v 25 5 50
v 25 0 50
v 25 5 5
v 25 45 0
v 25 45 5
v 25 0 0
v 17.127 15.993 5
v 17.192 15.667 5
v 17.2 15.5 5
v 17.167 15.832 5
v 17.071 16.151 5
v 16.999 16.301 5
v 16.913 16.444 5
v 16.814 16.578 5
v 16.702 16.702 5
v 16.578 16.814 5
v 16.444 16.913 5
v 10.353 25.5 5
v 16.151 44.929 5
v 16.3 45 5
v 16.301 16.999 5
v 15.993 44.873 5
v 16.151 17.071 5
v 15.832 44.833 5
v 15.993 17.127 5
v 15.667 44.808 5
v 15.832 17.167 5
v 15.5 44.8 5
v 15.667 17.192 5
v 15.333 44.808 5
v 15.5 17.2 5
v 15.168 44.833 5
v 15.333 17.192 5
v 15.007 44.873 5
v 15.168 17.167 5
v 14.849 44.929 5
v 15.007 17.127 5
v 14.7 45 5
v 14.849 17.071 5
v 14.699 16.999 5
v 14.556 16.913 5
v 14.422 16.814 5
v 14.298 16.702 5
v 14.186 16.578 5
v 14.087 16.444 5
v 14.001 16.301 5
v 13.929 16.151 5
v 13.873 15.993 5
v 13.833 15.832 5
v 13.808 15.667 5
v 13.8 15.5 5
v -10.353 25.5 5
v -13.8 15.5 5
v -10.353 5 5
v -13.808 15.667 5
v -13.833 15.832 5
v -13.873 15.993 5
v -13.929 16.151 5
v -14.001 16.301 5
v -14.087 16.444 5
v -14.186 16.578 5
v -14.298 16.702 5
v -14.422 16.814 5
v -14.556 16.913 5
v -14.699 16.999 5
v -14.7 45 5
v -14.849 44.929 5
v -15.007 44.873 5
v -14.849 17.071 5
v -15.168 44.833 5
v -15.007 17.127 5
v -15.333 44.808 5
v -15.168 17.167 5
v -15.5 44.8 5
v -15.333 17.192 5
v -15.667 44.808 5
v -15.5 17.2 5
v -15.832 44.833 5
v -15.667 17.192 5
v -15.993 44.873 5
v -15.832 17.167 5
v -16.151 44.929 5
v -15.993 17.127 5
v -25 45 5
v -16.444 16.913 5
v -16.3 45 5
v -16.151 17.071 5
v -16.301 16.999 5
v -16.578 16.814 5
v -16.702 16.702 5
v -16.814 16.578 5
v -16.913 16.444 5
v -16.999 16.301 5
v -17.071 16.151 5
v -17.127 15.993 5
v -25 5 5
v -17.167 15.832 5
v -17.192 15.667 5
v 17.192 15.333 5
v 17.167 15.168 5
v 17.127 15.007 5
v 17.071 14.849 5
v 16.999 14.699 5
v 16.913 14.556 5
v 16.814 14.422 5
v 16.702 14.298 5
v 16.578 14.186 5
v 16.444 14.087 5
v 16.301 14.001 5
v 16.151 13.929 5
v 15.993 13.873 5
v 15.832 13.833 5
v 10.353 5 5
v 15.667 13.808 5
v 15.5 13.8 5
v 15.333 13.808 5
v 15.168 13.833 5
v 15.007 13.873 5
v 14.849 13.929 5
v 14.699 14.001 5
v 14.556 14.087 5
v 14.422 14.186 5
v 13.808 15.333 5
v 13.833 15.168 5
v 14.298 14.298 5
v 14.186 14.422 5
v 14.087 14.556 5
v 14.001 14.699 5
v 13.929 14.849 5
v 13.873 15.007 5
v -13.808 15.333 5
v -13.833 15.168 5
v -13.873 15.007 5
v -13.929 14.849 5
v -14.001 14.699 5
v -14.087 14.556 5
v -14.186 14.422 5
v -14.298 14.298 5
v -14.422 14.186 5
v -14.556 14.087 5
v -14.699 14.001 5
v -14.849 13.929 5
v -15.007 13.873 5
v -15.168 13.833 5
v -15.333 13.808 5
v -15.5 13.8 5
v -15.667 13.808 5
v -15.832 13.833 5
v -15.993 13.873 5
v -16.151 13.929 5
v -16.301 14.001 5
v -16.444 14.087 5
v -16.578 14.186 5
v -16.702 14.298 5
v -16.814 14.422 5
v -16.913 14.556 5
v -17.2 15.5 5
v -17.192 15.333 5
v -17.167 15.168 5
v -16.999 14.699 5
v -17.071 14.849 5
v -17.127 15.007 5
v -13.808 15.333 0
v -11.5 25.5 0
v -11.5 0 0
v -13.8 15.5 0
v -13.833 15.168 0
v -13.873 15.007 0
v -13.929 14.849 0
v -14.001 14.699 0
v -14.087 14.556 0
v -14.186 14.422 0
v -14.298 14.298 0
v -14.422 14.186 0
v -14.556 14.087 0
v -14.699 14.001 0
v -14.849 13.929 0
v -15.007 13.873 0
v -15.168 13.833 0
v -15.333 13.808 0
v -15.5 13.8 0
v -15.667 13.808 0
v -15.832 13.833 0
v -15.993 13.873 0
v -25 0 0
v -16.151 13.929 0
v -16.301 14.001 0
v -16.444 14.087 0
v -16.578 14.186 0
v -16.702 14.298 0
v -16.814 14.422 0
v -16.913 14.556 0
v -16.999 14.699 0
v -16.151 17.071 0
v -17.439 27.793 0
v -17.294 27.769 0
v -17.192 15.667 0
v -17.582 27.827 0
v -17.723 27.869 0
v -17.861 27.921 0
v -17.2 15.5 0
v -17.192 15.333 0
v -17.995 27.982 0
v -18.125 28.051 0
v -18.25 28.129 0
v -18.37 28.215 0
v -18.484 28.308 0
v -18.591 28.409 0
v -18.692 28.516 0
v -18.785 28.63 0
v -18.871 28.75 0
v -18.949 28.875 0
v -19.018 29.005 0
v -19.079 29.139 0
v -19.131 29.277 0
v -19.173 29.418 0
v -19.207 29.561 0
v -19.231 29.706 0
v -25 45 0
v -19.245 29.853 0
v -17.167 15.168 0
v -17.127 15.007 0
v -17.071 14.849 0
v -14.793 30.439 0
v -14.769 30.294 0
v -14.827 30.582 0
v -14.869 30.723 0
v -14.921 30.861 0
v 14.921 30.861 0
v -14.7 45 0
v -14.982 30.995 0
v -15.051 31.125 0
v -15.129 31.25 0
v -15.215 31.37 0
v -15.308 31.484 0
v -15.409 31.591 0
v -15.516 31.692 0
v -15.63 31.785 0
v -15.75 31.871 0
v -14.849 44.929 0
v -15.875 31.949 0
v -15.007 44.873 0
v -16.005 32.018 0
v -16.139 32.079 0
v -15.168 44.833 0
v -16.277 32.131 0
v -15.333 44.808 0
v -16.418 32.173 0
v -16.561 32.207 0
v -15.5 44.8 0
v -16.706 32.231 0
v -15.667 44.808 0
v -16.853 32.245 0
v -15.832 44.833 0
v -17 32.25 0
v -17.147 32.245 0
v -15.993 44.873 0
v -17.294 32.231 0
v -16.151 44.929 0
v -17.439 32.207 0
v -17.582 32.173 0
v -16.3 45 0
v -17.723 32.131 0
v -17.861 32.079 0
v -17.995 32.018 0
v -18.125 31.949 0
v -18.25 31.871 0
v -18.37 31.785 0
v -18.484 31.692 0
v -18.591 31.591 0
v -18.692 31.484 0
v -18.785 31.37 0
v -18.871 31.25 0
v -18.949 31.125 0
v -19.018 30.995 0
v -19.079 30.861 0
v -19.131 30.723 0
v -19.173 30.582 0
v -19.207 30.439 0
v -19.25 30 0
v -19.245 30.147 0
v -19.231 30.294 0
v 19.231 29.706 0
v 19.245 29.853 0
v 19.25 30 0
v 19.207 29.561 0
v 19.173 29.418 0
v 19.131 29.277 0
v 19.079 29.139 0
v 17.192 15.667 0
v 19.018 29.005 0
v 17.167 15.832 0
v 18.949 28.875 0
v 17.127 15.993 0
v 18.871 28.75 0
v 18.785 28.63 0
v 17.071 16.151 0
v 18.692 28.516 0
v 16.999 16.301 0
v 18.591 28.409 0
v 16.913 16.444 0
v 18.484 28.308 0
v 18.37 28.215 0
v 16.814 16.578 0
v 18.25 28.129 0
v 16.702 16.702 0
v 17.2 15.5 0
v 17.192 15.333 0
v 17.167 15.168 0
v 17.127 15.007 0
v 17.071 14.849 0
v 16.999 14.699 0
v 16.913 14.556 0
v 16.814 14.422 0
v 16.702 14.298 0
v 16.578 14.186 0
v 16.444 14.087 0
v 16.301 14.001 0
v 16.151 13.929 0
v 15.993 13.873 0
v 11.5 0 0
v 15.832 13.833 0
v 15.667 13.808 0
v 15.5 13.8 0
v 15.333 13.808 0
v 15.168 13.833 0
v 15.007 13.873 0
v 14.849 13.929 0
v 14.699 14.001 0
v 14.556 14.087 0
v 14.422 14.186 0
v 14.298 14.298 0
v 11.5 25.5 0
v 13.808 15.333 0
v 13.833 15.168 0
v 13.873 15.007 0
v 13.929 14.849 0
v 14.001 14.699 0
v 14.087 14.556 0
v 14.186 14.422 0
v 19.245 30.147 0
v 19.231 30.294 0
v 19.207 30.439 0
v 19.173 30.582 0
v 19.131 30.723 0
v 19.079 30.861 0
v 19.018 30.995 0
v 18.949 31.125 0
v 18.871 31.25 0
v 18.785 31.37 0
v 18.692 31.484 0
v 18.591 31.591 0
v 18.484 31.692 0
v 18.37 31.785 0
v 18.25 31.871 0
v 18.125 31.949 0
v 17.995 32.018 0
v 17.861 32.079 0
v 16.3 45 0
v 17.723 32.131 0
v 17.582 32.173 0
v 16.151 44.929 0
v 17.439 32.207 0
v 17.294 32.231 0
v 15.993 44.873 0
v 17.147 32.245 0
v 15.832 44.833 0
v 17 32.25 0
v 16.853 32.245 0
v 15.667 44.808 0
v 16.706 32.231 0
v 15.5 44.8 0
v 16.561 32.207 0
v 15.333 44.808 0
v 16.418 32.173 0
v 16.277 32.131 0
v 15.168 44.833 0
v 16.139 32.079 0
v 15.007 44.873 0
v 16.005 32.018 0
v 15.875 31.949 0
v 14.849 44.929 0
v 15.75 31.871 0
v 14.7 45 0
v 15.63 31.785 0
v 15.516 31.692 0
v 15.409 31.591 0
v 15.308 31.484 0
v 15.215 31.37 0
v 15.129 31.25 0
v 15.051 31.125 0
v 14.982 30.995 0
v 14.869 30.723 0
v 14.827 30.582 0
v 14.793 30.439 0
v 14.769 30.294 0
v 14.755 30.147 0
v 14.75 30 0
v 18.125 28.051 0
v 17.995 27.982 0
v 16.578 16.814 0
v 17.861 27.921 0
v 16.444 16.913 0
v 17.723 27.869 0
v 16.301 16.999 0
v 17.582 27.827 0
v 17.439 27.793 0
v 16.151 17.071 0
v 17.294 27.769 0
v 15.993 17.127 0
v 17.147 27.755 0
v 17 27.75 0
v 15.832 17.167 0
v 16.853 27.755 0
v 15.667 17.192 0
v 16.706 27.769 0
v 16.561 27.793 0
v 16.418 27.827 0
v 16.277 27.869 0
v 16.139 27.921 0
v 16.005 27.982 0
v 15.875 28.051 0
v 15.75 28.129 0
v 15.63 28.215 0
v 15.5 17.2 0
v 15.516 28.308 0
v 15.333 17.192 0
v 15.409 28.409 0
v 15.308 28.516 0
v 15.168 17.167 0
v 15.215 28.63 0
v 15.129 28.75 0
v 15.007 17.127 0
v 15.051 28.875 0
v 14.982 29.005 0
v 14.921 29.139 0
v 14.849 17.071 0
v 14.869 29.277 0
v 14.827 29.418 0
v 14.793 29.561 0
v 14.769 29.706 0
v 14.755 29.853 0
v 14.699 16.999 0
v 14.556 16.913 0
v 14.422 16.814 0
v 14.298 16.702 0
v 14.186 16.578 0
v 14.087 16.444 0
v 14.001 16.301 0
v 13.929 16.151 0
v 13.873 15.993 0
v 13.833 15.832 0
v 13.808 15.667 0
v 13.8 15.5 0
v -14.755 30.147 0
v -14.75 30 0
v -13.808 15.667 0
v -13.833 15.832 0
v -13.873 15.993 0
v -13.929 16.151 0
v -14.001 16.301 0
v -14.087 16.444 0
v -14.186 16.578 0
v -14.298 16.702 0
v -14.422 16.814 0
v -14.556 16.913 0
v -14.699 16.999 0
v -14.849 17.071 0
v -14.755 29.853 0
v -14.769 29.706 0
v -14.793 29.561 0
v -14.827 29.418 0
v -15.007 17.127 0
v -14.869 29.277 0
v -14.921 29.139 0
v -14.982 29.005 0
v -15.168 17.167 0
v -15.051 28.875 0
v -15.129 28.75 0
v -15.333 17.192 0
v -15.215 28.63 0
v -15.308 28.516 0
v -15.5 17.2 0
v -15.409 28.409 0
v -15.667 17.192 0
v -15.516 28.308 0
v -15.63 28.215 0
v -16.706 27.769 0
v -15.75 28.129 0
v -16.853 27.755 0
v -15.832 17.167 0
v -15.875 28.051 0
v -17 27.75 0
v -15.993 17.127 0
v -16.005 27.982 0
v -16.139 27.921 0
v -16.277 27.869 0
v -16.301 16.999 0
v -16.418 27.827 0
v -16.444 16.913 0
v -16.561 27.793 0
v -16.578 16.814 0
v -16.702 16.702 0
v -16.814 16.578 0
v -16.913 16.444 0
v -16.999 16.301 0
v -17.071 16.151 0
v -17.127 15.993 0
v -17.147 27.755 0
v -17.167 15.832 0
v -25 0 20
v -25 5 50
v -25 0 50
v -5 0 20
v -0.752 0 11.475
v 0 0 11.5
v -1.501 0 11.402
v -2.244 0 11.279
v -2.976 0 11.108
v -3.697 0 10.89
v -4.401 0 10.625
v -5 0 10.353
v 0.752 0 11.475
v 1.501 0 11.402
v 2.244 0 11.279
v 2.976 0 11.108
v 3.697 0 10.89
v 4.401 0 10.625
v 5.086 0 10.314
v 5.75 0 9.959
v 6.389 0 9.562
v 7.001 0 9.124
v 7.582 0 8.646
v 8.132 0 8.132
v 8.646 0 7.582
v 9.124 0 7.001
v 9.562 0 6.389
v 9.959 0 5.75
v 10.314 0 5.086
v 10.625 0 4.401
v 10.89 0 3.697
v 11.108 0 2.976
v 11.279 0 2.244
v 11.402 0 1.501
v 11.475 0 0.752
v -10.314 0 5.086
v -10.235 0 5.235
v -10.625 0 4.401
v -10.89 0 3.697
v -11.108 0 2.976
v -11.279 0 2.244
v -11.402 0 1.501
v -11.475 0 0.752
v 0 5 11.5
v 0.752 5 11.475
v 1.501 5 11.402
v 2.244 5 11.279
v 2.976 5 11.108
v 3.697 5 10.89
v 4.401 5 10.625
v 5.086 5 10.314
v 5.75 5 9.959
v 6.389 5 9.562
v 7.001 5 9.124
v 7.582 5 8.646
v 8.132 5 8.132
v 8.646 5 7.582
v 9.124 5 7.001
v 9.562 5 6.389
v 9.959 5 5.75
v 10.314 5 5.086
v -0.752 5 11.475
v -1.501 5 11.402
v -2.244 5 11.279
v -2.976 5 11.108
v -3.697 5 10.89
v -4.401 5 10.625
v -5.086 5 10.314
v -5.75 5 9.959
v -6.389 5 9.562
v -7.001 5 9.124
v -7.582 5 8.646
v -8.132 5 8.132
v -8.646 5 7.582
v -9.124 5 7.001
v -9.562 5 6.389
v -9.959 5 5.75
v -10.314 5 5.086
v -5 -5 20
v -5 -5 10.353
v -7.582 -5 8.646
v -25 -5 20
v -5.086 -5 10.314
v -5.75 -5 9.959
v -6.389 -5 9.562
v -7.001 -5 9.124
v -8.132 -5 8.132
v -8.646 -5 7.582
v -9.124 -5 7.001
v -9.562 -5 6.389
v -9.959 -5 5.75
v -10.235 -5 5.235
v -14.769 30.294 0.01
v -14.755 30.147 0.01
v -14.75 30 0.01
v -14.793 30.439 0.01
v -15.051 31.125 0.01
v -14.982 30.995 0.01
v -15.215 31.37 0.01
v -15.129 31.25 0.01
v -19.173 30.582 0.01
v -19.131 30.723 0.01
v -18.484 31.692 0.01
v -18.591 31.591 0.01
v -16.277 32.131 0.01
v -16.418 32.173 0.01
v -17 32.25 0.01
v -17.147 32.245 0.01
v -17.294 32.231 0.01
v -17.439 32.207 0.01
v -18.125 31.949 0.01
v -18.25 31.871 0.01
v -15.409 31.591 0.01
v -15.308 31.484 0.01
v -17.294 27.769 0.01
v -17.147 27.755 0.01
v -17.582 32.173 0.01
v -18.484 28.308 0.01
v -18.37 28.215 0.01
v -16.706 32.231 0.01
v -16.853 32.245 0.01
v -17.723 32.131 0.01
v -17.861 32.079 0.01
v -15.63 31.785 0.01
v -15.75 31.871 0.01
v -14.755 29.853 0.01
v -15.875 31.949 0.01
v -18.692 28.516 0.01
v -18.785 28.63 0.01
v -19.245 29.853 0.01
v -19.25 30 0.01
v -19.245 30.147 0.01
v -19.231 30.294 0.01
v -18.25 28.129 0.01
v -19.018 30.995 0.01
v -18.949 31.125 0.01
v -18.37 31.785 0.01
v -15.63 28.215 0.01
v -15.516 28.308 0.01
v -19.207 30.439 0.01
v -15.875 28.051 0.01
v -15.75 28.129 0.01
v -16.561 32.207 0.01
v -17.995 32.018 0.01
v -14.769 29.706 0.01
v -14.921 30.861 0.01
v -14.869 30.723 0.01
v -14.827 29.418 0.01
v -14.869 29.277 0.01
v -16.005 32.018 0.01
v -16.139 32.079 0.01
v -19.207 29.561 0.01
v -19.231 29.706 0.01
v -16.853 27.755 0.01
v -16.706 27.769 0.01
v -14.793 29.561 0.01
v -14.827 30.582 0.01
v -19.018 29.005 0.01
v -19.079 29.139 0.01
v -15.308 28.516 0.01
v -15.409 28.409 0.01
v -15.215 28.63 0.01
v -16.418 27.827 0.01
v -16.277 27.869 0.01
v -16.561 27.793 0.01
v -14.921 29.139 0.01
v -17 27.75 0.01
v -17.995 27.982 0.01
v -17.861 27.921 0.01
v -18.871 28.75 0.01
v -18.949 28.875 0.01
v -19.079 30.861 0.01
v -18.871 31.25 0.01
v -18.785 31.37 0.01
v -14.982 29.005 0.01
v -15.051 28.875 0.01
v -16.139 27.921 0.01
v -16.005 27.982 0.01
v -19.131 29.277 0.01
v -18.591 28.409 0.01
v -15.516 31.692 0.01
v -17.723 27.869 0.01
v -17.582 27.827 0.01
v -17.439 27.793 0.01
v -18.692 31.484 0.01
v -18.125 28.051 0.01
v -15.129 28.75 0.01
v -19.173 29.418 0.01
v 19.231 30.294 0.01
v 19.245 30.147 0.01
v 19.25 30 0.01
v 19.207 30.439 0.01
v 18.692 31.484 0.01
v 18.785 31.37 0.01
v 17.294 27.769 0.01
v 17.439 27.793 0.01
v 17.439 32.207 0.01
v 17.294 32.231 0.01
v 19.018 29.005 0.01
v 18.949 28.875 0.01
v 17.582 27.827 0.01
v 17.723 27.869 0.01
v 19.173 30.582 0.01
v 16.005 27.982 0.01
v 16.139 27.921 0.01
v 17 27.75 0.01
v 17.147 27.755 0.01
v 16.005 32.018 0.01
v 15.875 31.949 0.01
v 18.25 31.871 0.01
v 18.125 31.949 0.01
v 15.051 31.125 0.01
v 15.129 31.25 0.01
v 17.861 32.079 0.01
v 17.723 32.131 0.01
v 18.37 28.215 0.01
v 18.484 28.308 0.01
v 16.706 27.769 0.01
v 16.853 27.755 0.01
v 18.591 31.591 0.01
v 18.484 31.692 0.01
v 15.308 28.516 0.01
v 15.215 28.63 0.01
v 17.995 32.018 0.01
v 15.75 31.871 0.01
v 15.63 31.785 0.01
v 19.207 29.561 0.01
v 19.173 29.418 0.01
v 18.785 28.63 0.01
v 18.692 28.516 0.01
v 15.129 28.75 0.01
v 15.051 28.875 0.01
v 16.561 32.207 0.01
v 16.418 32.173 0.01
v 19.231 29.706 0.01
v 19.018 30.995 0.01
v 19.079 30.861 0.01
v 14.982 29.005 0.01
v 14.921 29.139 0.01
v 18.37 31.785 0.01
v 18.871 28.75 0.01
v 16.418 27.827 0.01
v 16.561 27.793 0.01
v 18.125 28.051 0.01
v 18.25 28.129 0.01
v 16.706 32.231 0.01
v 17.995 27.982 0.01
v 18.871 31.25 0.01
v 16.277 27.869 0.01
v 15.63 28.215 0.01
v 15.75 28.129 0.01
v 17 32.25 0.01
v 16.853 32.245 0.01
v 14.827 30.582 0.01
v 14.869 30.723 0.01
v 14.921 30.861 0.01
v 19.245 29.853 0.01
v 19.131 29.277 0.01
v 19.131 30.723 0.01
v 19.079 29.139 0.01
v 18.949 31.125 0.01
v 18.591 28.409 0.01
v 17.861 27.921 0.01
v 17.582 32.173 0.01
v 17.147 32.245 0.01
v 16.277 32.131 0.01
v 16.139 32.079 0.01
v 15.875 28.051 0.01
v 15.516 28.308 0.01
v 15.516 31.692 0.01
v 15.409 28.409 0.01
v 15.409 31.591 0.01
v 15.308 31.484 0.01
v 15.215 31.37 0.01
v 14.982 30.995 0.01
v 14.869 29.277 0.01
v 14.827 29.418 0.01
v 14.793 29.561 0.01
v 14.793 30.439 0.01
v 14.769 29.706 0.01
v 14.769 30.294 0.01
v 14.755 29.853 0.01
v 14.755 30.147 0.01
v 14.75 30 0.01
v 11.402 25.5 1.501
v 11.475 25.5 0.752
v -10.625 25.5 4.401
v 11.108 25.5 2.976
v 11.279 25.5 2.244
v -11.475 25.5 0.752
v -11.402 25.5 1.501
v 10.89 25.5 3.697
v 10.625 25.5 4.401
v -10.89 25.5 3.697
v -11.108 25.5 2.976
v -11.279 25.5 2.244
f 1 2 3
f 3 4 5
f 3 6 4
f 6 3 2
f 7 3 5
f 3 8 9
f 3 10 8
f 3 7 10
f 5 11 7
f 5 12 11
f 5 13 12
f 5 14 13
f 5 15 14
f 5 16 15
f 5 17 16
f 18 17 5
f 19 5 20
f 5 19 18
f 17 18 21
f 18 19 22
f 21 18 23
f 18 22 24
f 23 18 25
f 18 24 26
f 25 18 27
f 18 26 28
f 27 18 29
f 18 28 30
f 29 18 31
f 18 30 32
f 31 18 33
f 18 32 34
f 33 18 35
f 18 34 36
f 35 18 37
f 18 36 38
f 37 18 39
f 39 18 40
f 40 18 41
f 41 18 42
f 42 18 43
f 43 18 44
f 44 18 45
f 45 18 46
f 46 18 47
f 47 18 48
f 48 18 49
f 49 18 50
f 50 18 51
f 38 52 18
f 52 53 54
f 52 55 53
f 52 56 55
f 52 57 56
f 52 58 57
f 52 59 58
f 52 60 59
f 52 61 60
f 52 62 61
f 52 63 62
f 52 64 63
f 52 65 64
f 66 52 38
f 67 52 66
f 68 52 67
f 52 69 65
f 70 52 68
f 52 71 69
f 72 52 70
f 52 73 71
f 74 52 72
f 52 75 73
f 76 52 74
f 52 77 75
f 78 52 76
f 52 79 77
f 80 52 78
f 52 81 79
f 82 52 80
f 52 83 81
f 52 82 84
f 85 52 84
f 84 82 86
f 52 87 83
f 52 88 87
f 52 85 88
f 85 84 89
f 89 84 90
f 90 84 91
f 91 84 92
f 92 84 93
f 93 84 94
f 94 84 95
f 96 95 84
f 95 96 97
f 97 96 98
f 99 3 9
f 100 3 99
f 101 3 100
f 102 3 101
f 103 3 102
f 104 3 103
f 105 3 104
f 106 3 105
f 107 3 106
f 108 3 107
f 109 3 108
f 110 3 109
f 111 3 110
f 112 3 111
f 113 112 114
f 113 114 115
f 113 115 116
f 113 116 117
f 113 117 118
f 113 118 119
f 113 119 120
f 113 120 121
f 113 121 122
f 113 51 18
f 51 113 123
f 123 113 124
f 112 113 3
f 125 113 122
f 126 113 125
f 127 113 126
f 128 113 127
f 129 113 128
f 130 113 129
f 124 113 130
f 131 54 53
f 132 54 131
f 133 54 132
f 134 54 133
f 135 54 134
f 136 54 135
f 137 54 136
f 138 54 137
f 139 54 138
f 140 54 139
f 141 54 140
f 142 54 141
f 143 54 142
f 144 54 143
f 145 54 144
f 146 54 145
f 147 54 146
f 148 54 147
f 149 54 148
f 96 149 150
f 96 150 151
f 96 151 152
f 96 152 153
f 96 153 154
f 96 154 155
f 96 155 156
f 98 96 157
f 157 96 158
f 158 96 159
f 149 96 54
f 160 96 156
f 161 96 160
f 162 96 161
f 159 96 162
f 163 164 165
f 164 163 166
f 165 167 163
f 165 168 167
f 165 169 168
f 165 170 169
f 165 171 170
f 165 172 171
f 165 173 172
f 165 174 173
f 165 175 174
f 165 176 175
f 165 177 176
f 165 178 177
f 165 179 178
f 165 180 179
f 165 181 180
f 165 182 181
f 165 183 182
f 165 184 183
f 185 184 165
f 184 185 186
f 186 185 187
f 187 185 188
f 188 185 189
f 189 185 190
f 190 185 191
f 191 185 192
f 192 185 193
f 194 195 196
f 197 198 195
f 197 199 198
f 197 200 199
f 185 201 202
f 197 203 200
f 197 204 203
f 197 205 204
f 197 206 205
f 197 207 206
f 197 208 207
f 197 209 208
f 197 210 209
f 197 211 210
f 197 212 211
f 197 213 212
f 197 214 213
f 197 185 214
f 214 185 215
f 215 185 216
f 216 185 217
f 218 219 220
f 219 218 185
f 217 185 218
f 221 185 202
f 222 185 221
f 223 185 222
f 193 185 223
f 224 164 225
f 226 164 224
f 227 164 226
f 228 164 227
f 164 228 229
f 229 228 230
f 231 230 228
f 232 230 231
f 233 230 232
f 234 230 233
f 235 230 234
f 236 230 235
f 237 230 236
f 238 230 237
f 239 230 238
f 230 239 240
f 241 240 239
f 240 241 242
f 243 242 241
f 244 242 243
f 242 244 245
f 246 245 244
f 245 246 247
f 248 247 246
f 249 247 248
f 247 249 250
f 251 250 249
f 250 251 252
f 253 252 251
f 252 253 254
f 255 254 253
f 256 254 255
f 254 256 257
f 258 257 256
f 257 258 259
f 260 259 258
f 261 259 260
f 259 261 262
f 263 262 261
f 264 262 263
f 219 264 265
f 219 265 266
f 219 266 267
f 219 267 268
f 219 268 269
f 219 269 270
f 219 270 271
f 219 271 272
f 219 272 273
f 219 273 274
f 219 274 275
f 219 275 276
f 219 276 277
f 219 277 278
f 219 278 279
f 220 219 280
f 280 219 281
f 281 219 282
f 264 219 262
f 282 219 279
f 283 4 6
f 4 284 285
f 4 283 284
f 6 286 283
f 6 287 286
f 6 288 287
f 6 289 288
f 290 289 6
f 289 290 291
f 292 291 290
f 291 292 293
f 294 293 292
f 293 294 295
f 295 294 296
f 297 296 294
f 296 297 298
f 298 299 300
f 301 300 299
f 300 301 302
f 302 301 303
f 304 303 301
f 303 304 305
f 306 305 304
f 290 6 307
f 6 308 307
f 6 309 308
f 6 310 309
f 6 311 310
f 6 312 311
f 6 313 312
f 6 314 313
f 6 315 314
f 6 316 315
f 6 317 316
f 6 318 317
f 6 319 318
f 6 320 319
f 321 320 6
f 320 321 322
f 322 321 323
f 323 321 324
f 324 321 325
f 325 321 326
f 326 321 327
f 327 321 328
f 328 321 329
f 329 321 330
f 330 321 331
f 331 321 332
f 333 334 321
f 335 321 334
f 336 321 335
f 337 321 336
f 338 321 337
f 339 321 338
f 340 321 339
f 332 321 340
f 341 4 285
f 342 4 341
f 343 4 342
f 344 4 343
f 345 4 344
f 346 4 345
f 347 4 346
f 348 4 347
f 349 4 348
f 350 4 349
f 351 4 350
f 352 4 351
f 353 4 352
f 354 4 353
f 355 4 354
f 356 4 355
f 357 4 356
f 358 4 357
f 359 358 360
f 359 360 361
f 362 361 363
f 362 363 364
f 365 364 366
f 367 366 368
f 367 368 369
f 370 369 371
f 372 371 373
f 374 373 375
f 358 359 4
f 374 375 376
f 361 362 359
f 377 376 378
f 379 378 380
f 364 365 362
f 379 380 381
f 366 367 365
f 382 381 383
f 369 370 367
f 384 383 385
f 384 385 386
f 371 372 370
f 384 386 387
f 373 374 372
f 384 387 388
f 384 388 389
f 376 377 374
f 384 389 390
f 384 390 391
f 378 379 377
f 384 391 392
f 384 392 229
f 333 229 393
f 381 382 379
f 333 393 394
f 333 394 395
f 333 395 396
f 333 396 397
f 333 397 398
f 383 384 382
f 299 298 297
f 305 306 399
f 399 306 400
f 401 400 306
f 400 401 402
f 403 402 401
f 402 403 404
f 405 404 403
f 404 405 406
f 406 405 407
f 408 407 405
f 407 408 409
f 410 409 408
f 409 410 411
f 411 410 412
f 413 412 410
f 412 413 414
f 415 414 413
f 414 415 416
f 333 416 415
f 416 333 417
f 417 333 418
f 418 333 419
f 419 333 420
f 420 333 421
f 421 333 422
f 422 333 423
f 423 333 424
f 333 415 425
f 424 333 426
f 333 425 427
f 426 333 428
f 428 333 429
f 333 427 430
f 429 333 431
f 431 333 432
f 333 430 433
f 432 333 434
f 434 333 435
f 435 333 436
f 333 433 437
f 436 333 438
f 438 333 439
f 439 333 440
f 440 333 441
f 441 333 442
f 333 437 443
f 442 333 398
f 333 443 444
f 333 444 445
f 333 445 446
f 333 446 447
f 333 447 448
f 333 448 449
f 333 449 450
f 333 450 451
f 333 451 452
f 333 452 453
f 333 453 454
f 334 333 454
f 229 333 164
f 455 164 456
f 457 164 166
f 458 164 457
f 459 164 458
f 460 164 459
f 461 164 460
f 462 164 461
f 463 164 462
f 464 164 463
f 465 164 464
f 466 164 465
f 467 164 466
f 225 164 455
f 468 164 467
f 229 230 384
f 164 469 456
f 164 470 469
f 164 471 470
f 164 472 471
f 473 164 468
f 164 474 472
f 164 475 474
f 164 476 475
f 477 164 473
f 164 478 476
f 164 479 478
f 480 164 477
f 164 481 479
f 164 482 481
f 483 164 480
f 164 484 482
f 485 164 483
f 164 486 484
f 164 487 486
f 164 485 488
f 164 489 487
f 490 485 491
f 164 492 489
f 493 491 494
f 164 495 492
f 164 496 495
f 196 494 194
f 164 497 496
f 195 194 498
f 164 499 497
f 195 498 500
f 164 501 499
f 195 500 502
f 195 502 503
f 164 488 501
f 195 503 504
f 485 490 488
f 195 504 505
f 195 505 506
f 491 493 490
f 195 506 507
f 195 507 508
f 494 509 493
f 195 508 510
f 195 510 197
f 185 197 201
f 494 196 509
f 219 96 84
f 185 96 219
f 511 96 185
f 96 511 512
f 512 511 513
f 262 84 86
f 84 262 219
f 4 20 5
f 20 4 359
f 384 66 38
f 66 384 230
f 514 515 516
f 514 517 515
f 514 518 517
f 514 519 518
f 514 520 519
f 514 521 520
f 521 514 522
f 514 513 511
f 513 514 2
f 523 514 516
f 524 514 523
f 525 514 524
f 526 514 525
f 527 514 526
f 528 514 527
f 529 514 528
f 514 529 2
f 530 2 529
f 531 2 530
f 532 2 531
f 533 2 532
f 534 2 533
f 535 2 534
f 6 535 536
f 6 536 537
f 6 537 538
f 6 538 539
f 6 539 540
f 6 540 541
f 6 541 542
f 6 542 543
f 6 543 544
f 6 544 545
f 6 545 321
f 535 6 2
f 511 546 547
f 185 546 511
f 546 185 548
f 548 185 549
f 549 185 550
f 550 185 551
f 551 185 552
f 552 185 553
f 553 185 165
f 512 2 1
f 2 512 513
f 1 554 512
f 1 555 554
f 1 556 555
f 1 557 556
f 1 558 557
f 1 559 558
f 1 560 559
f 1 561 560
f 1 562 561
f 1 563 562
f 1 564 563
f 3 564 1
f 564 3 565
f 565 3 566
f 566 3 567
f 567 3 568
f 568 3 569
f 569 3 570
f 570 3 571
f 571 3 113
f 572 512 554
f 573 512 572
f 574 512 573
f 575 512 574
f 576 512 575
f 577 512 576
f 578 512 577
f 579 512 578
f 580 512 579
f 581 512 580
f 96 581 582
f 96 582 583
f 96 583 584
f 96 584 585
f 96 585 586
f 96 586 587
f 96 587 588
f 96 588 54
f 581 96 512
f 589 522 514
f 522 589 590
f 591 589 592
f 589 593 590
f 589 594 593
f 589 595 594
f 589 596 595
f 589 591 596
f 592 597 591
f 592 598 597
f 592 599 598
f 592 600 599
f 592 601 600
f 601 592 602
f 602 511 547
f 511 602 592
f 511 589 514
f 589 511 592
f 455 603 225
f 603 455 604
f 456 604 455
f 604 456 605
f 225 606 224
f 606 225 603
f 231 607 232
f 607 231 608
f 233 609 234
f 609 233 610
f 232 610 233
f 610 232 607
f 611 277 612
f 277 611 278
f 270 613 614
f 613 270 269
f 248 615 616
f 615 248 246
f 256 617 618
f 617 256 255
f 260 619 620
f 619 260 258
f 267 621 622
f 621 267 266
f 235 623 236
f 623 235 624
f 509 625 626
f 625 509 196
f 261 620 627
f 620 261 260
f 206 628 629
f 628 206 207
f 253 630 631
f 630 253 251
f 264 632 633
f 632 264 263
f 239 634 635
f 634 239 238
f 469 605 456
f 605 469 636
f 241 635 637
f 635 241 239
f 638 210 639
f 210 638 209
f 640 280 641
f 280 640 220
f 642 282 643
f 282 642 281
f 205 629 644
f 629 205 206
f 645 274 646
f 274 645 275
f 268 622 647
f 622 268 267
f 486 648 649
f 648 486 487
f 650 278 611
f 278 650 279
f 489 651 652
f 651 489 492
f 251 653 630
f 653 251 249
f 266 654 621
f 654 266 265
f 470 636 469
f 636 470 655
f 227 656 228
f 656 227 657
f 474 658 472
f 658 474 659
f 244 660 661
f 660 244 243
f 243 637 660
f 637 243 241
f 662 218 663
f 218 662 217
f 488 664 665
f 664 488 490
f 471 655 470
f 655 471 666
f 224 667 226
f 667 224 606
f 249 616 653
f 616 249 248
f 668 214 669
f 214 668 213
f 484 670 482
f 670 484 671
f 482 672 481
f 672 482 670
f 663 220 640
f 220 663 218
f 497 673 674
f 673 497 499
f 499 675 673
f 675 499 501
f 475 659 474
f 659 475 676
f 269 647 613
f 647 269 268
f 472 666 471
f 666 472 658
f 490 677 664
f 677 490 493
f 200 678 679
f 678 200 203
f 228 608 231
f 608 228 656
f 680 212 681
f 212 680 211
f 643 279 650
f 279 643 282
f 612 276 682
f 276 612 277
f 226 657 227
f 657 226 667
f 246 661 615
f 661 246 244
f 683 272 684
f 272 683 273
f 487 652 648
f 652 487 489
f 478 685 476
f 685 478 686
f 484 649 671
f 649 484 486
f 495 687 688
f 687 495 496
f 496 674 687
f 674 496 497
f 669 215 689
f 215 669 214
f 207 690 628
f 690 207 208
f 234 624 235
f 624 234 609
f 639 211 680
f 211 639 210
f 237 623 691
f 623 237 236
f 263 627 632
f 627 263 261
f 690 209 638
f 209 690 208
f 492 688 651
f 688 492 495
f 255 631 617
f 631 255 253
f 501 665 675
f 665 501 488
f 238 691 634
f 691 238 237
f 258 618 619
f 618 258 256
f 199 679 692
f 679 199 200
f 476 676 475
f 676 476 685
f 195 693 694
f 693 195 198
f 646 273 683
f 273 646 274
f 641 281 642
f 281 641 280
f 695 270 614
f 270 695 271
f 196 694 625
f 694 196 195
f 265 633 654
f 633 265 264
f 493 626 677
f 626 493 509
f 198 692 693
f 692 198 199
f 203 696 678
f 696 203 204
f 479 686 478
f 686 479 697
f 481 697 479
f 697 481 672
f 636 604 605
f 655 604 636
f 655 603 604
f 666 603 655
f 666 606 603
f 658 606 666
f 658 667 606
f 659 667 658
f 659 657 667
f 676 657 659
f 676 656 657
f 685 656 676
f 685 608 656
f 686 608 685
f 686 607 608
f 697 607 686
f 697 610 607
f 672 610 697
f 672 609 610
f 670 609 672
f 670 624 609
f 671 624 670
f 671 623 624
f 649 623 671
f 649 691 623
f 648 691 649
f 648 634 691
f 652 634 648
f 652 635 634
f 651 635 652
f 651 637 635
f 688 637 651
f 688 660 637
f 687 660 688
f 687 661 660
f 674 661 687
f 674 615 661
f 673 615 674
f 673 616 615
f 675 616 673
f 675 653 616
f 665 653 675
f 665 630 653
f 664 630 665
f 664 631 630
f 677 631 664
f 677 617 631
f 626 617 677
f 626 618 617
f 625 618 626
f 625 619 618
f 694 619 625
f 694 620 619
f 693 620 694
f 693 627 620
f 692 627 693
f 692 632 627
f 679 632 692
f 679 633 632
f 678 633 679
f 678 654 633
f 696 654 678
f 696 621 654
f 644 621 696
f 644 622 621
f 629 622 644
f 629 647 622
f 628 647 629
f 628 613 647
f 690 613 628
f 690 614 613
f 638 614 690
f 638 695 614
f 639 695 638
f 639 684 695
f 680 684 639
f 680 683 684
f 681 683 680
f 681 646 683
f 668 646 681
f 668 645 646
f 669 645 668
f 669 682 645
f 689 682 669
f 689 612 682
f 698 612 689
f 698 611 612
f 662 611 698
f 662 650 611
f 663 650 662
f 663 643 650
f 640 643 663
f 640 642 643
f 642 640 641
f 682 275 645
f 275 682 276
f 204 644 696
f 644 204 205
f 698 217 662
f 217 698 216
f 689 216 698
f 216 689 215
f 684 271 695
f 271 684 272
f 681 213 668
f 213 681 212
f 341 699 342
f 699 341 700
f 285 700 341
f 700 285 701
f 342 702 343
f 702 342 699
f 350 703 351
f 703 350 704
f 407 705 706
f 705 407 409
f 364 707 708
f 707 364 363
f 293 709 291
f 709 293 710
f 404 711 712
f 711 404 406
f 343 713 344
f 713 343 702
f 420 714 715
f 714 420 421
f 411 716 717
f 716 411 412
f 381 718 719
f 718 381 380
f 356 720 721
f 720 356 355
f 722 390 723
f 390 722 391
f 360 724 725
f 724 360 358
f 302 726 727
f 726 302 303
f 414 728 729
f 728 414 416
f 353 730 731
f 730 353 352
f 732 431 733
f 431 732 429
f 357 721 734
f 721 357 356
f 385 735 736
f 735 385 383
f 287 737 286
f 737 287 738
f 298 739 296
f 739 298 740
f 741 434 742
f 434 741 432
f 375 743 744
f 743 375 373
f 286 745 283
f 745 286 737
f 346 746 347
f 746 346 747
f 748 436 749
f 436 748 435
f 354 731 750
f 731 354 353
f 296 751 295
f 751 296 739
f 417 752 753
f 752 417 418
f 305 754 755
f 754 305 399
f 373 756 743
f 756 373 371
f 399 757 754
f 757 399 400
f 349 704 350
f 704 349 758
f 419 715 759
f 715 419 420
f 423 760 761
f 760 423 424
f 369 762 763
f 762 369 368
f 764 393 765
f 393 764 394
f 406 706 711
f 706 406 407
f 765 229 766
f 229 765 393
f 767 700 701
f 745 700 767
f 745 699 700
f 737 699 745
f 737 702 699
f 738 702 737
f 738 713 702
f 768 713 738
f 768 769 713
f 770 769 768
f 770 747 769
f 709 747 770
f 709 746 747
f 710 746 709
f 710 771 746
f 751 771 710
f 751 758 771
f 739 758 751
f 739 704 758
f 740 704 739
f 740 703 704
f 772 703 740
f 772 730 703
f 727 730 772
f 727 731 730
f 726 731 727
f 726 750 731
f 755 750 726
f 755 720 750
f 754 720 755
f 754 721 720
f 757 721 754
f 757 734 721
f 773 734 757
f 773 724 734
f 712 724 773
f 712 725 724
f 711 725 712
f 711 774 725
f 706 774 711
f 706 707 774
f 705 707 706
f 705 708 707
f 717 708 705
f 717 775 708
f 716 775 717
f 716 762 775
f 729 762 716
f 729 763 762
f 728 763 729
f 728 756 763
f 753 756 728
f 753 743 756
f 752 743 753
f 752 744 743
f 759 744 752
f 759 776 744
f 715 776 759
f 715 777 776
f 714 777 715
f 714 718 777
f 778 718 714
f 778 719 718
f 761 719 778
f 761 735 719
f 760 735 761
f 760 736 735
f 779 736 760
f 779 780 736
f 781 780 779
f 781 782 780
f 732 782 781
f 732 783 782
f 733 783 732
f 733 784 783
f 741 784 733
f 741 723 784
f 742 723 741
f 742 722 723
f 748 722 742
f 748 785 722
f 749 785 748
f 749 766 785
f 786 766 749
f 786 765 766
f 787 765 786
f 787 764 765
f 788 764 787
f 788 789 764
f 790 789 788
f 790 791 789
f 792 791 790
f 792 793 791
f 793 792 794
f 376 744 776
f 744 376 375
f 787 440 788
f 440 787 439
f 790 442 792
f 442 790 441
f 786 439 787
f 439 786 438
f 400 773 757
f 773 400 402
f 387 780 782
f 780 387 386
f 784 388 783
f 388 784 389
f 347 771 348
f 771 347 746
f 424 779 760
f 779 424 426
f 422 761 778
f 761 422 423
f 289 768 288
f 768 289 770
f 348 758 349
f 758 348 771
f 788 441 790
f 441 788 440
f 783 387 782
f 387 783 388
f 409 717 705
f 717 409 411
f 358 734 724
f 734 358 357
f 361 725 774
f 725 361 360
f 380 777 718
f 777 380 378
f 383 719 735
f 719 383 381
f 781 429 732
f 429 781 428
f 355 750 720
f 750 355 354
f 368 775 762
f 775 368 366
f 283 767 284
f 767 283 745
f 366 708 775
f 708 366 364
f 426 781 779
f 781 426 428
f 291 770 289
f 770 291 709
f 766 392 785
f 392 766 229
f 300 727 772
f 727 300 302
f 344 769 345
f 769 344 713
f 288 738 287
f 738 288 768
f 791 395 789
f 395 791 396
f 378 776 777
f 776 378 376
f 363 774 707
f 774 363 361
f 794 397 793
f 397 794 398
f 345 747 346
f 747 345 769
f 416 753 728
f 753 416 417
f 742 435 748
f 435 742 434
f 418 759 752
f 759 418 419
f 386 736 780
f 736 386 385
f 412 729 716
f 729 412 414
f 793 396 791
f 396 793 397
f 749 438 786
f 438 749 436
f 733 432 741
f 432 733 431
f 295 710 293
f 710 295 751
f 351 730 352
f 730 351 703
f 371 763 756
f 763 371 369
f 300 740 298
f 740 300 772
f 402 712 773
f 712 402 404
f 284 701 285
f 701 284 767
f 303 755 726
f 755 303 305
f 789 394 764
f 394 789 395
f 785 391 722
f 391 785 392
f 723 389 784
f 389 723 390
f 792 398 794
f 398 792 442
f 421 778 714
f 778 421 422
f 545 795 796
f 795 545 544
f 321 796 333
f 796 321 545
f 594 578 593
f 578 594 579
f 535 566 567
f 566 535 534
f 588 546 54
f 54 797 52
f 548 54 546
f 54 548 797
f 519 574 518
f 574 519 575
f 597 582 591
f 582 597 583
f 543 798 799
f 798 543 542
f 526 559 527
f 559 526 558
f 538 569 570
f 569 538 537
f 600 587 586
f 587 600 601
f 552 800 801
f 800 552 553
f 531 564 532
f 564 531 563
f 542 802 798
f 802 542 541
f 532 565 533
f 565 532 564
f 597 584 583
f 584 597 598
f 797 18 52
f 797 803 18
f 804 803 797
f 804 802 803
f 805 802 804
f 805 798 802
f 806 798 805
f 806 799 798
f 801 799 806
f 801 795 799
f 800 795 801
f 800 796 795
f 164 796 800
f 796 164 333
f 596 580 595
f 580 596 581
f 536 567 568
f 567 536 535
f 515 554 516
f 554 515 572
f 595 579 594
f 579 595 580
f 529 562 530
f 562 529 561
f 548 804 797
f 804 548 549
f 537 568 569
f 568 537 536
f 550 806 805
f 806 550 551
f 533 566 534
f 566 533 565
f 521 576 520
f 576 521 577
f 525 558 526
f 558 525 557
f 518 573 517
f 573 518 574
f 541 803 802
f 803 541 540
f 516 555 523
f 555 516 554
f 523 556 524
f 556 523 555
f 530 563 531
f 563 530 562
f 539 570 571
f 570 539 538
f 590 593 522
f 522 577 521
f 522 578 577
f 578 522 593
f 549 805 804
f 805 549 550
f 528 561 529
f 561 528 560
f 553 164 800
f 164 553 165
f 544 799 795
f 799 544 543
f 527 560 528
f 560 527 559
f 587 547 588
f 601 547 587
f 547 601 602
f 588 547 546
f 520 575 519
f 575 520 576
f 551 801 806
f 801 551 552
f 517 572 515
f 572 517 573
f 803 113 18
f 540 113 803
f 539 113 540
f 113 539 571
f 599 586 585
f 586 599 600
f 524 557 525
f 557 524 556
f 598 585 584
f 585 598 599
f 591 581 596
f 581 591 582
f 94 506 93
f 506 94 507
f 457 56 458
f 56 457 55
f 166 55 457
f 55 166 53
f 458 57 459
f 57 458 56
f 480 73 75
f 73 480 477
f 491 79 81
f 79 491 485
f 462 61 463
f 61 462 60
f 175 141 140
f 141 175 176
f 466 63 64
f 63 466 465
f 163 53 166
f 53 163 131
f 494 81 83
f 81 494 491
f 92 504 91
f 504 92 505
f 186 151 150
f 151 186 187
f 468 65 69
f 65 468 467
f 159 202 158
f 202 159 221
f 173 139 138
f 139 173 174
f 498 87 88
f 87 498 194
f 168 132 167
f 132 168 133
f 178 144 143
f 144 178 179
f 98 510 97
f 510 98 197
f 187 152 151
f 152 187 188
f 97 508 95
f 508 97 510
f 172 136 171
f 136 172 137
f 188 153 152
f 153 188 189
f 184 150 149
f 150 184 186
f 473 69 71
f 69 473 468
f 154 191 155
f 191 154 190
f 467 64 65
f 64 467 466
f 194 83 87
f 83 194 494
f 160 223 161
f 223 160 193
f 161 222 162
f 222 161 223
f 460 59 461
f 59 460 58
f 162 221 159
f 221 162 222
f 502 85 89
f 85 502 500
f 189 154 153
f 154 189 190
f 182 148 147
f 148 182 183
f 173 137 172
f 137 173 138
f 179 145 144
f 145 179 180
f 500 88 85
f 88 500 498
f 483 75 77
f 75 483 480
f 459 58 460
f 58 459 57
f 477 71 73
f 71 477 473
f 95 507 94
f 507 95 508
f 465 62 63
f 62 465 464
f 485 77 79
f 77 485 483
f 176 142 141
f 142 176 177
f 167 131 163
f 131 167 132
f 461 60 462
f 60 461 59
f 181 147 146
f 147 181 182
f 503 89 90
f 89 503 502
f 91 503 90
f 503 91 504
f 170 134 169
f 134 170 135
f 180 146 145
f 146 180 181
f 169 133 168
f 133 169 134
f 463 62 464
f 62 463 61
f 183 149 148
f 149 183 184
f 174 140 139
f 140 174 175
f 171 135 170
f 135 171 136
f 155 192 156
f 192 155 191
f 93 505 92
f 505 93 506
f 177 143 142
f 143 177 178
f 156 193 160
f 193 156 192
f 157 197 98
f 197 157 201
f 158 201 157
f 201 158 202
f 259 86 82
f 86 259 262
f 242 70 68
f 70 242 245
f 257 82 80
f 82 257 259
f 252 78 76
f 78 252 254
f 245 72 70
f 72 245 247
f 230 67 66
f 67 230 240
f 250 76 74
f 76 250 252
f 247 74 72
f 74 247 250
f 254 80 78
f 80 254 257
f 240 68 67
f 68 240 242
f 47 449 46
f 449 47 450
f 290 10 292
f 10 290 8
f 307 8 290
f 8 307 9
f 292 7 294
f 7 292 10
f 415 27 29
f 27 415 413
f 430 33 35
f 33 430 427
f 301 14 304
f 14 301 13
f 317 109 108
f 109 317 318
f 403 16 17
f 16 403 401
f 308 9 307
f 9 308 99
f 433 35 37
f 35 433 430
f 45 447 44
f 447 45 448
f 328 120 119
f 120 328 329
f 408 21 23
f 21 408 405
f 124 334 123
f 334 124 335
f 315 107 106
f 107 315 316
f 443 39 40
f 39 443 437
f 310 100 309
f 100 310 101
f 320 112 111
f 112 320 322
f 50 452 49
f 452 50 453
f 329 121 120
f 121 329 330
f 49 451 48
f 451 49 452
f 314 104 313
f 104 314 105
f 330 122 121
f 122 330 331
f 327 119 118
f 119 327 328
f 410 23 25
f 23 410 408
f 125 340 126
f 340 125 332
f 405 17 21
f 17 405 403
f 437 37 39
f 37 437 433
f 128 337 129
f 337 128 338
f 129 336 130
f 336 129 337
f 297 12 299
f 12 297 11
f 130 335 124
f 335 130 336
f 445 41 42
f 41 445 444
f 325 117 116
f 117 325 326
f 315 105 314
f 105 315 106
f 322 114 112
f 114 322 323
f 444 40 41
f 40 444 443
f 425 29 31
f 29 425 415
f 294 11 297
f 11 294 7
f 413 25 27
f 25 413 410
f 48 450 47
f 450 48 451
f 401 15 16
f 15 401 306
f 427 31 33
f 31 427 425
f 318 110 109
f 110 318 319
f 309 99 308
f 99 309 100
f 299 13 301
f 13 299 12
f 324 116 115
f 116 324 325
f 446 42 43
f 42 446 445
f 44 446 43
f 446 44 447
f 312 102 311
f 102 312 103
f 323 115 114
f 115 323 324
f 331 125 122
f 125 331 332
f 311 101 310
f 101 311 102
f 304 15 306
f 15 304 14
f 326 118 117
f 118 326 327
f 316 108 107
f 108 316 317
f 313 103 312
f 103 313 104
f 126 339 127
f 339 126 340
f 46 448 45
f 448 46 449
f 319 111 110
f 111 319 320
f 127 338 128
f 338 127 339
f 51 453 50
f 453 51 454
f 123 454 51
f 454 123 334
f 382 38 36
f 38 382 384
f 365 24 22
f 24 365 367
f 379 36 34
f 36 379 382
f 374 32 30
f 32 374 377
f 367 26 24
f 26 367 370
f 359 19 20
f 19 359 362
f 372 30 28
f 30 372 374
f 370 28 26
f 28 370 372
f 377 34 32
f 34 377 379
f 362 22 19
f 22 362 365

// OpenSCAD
// L-shaped mounting bracket for NEMA 17 stepper motor
// Print orientation: base plate on bed (z = 0), vertical plate builds upward (+Z)
// Units: mm

// ---------------- Parameters ----------------
base_x0      = -25;   // base plate X start
base_x1      = 25;    // base plate X end
base_y0      = 0;     // base plate Y start
base_y1      = 45;    // base plate Y end
base_z       = 5;     // base plate thickness

motor_h      = 50;    // vertical motor plate height
motor_y0     = 0;     // motor plate Y start (flush with base edge)
motor_y1     = 5;     // motor plate Y end (thickness)

boss_d       = 23;    // motor centring boss hole diameter
boss_x       = 0;     // boss hole X centre
boss_z       = 28;    // boss hole Z centre

screw_d      = 3.4;   // M3 screw hole diameter
screw_n      = 4;     // number of screw holes
screw_p      = 31;    // square pattern pitch (side length)

gusset_t     = 5;     // gusset thickness (along X)
gusset_leg   = 20;    // right-triangle leg length (along Y and Z)
gusset_x0    = -25;   // left gusset X start
gusset_x1    = -20;   // left gusset X end
// right gusset runs from x = 20 to x = 25 (flush with right edge)

eps          = 0.5;   // cutter overshoot past faces

$fn = 96;

// ---------------- Model ----------------
difference() {
    union() {
        // Base plate
        translate([base_x0, base_y0, 0])
            cube([base_x1 - base_x0, base_y1 - base_y0, base_z]);

        // Vertical motor plate
        translate([base_x0, motor_y0, 0])
            cube([base_x1 - base_x0, motor_y1 - motor_y0, motor_h]);

        // Gussets (right-triangle in YZ plane, extruded along X)
        for (sx = [-1, 1]) {
            x0 = sx == -1 ? gusset_x0 : gusset_x1;
            x1 = sx == -1 ? gusset_x1 : gusset_x0;
            translate([x0, 0, 0])
                rotate([90, 0, 0])
                    linear_extrude(height = x1 - x0)
                        polygon(points = [
                            [gusset_leg, gusset_leg],  // right-angle corner at y = 5, z = 5
                            [gusset_leg, 0],
                            [0, gusset_leg]
                        ]);
        }
    }

    // Base plate through-holes (M4)
    for (h = [base_z + eps, -eps]) {
        translate([-17, 30, h])
            cylinder(d = 4.5, h = abs(h) + 0.01);
        translate([17, 30, h])
            cylinder(d = 4.5, h = abs(h) + 0.01);
    }

    // Motor boss hole (along Y) and screw holes on square pattern
    {
        translate([0, 0, 0])
            rotate([90, 0, 0]) {
                difference() {
                    cylinder(d = boss_d, h = motor_h + 2 * eps, center = true);
                    translate([0, -eps, boss_z])
                        cylinder(d = boss_d + 2 * eps, h = motor_h + 2 * eps);
                }
            }
        for (i = [0 : screw_n - 1]) {
            for (j = [0 : screw_n - 1]) {
                translate([(i - (screw_n - 1) / 2) * screw_p,
                           (j - (screw_n - 1) / 2) * screw_p,
                           -eps])
                    cylinder(d = screw_d, h = motor_h + 2 * eps, $fn = 64);
            }
        }
    }
}
